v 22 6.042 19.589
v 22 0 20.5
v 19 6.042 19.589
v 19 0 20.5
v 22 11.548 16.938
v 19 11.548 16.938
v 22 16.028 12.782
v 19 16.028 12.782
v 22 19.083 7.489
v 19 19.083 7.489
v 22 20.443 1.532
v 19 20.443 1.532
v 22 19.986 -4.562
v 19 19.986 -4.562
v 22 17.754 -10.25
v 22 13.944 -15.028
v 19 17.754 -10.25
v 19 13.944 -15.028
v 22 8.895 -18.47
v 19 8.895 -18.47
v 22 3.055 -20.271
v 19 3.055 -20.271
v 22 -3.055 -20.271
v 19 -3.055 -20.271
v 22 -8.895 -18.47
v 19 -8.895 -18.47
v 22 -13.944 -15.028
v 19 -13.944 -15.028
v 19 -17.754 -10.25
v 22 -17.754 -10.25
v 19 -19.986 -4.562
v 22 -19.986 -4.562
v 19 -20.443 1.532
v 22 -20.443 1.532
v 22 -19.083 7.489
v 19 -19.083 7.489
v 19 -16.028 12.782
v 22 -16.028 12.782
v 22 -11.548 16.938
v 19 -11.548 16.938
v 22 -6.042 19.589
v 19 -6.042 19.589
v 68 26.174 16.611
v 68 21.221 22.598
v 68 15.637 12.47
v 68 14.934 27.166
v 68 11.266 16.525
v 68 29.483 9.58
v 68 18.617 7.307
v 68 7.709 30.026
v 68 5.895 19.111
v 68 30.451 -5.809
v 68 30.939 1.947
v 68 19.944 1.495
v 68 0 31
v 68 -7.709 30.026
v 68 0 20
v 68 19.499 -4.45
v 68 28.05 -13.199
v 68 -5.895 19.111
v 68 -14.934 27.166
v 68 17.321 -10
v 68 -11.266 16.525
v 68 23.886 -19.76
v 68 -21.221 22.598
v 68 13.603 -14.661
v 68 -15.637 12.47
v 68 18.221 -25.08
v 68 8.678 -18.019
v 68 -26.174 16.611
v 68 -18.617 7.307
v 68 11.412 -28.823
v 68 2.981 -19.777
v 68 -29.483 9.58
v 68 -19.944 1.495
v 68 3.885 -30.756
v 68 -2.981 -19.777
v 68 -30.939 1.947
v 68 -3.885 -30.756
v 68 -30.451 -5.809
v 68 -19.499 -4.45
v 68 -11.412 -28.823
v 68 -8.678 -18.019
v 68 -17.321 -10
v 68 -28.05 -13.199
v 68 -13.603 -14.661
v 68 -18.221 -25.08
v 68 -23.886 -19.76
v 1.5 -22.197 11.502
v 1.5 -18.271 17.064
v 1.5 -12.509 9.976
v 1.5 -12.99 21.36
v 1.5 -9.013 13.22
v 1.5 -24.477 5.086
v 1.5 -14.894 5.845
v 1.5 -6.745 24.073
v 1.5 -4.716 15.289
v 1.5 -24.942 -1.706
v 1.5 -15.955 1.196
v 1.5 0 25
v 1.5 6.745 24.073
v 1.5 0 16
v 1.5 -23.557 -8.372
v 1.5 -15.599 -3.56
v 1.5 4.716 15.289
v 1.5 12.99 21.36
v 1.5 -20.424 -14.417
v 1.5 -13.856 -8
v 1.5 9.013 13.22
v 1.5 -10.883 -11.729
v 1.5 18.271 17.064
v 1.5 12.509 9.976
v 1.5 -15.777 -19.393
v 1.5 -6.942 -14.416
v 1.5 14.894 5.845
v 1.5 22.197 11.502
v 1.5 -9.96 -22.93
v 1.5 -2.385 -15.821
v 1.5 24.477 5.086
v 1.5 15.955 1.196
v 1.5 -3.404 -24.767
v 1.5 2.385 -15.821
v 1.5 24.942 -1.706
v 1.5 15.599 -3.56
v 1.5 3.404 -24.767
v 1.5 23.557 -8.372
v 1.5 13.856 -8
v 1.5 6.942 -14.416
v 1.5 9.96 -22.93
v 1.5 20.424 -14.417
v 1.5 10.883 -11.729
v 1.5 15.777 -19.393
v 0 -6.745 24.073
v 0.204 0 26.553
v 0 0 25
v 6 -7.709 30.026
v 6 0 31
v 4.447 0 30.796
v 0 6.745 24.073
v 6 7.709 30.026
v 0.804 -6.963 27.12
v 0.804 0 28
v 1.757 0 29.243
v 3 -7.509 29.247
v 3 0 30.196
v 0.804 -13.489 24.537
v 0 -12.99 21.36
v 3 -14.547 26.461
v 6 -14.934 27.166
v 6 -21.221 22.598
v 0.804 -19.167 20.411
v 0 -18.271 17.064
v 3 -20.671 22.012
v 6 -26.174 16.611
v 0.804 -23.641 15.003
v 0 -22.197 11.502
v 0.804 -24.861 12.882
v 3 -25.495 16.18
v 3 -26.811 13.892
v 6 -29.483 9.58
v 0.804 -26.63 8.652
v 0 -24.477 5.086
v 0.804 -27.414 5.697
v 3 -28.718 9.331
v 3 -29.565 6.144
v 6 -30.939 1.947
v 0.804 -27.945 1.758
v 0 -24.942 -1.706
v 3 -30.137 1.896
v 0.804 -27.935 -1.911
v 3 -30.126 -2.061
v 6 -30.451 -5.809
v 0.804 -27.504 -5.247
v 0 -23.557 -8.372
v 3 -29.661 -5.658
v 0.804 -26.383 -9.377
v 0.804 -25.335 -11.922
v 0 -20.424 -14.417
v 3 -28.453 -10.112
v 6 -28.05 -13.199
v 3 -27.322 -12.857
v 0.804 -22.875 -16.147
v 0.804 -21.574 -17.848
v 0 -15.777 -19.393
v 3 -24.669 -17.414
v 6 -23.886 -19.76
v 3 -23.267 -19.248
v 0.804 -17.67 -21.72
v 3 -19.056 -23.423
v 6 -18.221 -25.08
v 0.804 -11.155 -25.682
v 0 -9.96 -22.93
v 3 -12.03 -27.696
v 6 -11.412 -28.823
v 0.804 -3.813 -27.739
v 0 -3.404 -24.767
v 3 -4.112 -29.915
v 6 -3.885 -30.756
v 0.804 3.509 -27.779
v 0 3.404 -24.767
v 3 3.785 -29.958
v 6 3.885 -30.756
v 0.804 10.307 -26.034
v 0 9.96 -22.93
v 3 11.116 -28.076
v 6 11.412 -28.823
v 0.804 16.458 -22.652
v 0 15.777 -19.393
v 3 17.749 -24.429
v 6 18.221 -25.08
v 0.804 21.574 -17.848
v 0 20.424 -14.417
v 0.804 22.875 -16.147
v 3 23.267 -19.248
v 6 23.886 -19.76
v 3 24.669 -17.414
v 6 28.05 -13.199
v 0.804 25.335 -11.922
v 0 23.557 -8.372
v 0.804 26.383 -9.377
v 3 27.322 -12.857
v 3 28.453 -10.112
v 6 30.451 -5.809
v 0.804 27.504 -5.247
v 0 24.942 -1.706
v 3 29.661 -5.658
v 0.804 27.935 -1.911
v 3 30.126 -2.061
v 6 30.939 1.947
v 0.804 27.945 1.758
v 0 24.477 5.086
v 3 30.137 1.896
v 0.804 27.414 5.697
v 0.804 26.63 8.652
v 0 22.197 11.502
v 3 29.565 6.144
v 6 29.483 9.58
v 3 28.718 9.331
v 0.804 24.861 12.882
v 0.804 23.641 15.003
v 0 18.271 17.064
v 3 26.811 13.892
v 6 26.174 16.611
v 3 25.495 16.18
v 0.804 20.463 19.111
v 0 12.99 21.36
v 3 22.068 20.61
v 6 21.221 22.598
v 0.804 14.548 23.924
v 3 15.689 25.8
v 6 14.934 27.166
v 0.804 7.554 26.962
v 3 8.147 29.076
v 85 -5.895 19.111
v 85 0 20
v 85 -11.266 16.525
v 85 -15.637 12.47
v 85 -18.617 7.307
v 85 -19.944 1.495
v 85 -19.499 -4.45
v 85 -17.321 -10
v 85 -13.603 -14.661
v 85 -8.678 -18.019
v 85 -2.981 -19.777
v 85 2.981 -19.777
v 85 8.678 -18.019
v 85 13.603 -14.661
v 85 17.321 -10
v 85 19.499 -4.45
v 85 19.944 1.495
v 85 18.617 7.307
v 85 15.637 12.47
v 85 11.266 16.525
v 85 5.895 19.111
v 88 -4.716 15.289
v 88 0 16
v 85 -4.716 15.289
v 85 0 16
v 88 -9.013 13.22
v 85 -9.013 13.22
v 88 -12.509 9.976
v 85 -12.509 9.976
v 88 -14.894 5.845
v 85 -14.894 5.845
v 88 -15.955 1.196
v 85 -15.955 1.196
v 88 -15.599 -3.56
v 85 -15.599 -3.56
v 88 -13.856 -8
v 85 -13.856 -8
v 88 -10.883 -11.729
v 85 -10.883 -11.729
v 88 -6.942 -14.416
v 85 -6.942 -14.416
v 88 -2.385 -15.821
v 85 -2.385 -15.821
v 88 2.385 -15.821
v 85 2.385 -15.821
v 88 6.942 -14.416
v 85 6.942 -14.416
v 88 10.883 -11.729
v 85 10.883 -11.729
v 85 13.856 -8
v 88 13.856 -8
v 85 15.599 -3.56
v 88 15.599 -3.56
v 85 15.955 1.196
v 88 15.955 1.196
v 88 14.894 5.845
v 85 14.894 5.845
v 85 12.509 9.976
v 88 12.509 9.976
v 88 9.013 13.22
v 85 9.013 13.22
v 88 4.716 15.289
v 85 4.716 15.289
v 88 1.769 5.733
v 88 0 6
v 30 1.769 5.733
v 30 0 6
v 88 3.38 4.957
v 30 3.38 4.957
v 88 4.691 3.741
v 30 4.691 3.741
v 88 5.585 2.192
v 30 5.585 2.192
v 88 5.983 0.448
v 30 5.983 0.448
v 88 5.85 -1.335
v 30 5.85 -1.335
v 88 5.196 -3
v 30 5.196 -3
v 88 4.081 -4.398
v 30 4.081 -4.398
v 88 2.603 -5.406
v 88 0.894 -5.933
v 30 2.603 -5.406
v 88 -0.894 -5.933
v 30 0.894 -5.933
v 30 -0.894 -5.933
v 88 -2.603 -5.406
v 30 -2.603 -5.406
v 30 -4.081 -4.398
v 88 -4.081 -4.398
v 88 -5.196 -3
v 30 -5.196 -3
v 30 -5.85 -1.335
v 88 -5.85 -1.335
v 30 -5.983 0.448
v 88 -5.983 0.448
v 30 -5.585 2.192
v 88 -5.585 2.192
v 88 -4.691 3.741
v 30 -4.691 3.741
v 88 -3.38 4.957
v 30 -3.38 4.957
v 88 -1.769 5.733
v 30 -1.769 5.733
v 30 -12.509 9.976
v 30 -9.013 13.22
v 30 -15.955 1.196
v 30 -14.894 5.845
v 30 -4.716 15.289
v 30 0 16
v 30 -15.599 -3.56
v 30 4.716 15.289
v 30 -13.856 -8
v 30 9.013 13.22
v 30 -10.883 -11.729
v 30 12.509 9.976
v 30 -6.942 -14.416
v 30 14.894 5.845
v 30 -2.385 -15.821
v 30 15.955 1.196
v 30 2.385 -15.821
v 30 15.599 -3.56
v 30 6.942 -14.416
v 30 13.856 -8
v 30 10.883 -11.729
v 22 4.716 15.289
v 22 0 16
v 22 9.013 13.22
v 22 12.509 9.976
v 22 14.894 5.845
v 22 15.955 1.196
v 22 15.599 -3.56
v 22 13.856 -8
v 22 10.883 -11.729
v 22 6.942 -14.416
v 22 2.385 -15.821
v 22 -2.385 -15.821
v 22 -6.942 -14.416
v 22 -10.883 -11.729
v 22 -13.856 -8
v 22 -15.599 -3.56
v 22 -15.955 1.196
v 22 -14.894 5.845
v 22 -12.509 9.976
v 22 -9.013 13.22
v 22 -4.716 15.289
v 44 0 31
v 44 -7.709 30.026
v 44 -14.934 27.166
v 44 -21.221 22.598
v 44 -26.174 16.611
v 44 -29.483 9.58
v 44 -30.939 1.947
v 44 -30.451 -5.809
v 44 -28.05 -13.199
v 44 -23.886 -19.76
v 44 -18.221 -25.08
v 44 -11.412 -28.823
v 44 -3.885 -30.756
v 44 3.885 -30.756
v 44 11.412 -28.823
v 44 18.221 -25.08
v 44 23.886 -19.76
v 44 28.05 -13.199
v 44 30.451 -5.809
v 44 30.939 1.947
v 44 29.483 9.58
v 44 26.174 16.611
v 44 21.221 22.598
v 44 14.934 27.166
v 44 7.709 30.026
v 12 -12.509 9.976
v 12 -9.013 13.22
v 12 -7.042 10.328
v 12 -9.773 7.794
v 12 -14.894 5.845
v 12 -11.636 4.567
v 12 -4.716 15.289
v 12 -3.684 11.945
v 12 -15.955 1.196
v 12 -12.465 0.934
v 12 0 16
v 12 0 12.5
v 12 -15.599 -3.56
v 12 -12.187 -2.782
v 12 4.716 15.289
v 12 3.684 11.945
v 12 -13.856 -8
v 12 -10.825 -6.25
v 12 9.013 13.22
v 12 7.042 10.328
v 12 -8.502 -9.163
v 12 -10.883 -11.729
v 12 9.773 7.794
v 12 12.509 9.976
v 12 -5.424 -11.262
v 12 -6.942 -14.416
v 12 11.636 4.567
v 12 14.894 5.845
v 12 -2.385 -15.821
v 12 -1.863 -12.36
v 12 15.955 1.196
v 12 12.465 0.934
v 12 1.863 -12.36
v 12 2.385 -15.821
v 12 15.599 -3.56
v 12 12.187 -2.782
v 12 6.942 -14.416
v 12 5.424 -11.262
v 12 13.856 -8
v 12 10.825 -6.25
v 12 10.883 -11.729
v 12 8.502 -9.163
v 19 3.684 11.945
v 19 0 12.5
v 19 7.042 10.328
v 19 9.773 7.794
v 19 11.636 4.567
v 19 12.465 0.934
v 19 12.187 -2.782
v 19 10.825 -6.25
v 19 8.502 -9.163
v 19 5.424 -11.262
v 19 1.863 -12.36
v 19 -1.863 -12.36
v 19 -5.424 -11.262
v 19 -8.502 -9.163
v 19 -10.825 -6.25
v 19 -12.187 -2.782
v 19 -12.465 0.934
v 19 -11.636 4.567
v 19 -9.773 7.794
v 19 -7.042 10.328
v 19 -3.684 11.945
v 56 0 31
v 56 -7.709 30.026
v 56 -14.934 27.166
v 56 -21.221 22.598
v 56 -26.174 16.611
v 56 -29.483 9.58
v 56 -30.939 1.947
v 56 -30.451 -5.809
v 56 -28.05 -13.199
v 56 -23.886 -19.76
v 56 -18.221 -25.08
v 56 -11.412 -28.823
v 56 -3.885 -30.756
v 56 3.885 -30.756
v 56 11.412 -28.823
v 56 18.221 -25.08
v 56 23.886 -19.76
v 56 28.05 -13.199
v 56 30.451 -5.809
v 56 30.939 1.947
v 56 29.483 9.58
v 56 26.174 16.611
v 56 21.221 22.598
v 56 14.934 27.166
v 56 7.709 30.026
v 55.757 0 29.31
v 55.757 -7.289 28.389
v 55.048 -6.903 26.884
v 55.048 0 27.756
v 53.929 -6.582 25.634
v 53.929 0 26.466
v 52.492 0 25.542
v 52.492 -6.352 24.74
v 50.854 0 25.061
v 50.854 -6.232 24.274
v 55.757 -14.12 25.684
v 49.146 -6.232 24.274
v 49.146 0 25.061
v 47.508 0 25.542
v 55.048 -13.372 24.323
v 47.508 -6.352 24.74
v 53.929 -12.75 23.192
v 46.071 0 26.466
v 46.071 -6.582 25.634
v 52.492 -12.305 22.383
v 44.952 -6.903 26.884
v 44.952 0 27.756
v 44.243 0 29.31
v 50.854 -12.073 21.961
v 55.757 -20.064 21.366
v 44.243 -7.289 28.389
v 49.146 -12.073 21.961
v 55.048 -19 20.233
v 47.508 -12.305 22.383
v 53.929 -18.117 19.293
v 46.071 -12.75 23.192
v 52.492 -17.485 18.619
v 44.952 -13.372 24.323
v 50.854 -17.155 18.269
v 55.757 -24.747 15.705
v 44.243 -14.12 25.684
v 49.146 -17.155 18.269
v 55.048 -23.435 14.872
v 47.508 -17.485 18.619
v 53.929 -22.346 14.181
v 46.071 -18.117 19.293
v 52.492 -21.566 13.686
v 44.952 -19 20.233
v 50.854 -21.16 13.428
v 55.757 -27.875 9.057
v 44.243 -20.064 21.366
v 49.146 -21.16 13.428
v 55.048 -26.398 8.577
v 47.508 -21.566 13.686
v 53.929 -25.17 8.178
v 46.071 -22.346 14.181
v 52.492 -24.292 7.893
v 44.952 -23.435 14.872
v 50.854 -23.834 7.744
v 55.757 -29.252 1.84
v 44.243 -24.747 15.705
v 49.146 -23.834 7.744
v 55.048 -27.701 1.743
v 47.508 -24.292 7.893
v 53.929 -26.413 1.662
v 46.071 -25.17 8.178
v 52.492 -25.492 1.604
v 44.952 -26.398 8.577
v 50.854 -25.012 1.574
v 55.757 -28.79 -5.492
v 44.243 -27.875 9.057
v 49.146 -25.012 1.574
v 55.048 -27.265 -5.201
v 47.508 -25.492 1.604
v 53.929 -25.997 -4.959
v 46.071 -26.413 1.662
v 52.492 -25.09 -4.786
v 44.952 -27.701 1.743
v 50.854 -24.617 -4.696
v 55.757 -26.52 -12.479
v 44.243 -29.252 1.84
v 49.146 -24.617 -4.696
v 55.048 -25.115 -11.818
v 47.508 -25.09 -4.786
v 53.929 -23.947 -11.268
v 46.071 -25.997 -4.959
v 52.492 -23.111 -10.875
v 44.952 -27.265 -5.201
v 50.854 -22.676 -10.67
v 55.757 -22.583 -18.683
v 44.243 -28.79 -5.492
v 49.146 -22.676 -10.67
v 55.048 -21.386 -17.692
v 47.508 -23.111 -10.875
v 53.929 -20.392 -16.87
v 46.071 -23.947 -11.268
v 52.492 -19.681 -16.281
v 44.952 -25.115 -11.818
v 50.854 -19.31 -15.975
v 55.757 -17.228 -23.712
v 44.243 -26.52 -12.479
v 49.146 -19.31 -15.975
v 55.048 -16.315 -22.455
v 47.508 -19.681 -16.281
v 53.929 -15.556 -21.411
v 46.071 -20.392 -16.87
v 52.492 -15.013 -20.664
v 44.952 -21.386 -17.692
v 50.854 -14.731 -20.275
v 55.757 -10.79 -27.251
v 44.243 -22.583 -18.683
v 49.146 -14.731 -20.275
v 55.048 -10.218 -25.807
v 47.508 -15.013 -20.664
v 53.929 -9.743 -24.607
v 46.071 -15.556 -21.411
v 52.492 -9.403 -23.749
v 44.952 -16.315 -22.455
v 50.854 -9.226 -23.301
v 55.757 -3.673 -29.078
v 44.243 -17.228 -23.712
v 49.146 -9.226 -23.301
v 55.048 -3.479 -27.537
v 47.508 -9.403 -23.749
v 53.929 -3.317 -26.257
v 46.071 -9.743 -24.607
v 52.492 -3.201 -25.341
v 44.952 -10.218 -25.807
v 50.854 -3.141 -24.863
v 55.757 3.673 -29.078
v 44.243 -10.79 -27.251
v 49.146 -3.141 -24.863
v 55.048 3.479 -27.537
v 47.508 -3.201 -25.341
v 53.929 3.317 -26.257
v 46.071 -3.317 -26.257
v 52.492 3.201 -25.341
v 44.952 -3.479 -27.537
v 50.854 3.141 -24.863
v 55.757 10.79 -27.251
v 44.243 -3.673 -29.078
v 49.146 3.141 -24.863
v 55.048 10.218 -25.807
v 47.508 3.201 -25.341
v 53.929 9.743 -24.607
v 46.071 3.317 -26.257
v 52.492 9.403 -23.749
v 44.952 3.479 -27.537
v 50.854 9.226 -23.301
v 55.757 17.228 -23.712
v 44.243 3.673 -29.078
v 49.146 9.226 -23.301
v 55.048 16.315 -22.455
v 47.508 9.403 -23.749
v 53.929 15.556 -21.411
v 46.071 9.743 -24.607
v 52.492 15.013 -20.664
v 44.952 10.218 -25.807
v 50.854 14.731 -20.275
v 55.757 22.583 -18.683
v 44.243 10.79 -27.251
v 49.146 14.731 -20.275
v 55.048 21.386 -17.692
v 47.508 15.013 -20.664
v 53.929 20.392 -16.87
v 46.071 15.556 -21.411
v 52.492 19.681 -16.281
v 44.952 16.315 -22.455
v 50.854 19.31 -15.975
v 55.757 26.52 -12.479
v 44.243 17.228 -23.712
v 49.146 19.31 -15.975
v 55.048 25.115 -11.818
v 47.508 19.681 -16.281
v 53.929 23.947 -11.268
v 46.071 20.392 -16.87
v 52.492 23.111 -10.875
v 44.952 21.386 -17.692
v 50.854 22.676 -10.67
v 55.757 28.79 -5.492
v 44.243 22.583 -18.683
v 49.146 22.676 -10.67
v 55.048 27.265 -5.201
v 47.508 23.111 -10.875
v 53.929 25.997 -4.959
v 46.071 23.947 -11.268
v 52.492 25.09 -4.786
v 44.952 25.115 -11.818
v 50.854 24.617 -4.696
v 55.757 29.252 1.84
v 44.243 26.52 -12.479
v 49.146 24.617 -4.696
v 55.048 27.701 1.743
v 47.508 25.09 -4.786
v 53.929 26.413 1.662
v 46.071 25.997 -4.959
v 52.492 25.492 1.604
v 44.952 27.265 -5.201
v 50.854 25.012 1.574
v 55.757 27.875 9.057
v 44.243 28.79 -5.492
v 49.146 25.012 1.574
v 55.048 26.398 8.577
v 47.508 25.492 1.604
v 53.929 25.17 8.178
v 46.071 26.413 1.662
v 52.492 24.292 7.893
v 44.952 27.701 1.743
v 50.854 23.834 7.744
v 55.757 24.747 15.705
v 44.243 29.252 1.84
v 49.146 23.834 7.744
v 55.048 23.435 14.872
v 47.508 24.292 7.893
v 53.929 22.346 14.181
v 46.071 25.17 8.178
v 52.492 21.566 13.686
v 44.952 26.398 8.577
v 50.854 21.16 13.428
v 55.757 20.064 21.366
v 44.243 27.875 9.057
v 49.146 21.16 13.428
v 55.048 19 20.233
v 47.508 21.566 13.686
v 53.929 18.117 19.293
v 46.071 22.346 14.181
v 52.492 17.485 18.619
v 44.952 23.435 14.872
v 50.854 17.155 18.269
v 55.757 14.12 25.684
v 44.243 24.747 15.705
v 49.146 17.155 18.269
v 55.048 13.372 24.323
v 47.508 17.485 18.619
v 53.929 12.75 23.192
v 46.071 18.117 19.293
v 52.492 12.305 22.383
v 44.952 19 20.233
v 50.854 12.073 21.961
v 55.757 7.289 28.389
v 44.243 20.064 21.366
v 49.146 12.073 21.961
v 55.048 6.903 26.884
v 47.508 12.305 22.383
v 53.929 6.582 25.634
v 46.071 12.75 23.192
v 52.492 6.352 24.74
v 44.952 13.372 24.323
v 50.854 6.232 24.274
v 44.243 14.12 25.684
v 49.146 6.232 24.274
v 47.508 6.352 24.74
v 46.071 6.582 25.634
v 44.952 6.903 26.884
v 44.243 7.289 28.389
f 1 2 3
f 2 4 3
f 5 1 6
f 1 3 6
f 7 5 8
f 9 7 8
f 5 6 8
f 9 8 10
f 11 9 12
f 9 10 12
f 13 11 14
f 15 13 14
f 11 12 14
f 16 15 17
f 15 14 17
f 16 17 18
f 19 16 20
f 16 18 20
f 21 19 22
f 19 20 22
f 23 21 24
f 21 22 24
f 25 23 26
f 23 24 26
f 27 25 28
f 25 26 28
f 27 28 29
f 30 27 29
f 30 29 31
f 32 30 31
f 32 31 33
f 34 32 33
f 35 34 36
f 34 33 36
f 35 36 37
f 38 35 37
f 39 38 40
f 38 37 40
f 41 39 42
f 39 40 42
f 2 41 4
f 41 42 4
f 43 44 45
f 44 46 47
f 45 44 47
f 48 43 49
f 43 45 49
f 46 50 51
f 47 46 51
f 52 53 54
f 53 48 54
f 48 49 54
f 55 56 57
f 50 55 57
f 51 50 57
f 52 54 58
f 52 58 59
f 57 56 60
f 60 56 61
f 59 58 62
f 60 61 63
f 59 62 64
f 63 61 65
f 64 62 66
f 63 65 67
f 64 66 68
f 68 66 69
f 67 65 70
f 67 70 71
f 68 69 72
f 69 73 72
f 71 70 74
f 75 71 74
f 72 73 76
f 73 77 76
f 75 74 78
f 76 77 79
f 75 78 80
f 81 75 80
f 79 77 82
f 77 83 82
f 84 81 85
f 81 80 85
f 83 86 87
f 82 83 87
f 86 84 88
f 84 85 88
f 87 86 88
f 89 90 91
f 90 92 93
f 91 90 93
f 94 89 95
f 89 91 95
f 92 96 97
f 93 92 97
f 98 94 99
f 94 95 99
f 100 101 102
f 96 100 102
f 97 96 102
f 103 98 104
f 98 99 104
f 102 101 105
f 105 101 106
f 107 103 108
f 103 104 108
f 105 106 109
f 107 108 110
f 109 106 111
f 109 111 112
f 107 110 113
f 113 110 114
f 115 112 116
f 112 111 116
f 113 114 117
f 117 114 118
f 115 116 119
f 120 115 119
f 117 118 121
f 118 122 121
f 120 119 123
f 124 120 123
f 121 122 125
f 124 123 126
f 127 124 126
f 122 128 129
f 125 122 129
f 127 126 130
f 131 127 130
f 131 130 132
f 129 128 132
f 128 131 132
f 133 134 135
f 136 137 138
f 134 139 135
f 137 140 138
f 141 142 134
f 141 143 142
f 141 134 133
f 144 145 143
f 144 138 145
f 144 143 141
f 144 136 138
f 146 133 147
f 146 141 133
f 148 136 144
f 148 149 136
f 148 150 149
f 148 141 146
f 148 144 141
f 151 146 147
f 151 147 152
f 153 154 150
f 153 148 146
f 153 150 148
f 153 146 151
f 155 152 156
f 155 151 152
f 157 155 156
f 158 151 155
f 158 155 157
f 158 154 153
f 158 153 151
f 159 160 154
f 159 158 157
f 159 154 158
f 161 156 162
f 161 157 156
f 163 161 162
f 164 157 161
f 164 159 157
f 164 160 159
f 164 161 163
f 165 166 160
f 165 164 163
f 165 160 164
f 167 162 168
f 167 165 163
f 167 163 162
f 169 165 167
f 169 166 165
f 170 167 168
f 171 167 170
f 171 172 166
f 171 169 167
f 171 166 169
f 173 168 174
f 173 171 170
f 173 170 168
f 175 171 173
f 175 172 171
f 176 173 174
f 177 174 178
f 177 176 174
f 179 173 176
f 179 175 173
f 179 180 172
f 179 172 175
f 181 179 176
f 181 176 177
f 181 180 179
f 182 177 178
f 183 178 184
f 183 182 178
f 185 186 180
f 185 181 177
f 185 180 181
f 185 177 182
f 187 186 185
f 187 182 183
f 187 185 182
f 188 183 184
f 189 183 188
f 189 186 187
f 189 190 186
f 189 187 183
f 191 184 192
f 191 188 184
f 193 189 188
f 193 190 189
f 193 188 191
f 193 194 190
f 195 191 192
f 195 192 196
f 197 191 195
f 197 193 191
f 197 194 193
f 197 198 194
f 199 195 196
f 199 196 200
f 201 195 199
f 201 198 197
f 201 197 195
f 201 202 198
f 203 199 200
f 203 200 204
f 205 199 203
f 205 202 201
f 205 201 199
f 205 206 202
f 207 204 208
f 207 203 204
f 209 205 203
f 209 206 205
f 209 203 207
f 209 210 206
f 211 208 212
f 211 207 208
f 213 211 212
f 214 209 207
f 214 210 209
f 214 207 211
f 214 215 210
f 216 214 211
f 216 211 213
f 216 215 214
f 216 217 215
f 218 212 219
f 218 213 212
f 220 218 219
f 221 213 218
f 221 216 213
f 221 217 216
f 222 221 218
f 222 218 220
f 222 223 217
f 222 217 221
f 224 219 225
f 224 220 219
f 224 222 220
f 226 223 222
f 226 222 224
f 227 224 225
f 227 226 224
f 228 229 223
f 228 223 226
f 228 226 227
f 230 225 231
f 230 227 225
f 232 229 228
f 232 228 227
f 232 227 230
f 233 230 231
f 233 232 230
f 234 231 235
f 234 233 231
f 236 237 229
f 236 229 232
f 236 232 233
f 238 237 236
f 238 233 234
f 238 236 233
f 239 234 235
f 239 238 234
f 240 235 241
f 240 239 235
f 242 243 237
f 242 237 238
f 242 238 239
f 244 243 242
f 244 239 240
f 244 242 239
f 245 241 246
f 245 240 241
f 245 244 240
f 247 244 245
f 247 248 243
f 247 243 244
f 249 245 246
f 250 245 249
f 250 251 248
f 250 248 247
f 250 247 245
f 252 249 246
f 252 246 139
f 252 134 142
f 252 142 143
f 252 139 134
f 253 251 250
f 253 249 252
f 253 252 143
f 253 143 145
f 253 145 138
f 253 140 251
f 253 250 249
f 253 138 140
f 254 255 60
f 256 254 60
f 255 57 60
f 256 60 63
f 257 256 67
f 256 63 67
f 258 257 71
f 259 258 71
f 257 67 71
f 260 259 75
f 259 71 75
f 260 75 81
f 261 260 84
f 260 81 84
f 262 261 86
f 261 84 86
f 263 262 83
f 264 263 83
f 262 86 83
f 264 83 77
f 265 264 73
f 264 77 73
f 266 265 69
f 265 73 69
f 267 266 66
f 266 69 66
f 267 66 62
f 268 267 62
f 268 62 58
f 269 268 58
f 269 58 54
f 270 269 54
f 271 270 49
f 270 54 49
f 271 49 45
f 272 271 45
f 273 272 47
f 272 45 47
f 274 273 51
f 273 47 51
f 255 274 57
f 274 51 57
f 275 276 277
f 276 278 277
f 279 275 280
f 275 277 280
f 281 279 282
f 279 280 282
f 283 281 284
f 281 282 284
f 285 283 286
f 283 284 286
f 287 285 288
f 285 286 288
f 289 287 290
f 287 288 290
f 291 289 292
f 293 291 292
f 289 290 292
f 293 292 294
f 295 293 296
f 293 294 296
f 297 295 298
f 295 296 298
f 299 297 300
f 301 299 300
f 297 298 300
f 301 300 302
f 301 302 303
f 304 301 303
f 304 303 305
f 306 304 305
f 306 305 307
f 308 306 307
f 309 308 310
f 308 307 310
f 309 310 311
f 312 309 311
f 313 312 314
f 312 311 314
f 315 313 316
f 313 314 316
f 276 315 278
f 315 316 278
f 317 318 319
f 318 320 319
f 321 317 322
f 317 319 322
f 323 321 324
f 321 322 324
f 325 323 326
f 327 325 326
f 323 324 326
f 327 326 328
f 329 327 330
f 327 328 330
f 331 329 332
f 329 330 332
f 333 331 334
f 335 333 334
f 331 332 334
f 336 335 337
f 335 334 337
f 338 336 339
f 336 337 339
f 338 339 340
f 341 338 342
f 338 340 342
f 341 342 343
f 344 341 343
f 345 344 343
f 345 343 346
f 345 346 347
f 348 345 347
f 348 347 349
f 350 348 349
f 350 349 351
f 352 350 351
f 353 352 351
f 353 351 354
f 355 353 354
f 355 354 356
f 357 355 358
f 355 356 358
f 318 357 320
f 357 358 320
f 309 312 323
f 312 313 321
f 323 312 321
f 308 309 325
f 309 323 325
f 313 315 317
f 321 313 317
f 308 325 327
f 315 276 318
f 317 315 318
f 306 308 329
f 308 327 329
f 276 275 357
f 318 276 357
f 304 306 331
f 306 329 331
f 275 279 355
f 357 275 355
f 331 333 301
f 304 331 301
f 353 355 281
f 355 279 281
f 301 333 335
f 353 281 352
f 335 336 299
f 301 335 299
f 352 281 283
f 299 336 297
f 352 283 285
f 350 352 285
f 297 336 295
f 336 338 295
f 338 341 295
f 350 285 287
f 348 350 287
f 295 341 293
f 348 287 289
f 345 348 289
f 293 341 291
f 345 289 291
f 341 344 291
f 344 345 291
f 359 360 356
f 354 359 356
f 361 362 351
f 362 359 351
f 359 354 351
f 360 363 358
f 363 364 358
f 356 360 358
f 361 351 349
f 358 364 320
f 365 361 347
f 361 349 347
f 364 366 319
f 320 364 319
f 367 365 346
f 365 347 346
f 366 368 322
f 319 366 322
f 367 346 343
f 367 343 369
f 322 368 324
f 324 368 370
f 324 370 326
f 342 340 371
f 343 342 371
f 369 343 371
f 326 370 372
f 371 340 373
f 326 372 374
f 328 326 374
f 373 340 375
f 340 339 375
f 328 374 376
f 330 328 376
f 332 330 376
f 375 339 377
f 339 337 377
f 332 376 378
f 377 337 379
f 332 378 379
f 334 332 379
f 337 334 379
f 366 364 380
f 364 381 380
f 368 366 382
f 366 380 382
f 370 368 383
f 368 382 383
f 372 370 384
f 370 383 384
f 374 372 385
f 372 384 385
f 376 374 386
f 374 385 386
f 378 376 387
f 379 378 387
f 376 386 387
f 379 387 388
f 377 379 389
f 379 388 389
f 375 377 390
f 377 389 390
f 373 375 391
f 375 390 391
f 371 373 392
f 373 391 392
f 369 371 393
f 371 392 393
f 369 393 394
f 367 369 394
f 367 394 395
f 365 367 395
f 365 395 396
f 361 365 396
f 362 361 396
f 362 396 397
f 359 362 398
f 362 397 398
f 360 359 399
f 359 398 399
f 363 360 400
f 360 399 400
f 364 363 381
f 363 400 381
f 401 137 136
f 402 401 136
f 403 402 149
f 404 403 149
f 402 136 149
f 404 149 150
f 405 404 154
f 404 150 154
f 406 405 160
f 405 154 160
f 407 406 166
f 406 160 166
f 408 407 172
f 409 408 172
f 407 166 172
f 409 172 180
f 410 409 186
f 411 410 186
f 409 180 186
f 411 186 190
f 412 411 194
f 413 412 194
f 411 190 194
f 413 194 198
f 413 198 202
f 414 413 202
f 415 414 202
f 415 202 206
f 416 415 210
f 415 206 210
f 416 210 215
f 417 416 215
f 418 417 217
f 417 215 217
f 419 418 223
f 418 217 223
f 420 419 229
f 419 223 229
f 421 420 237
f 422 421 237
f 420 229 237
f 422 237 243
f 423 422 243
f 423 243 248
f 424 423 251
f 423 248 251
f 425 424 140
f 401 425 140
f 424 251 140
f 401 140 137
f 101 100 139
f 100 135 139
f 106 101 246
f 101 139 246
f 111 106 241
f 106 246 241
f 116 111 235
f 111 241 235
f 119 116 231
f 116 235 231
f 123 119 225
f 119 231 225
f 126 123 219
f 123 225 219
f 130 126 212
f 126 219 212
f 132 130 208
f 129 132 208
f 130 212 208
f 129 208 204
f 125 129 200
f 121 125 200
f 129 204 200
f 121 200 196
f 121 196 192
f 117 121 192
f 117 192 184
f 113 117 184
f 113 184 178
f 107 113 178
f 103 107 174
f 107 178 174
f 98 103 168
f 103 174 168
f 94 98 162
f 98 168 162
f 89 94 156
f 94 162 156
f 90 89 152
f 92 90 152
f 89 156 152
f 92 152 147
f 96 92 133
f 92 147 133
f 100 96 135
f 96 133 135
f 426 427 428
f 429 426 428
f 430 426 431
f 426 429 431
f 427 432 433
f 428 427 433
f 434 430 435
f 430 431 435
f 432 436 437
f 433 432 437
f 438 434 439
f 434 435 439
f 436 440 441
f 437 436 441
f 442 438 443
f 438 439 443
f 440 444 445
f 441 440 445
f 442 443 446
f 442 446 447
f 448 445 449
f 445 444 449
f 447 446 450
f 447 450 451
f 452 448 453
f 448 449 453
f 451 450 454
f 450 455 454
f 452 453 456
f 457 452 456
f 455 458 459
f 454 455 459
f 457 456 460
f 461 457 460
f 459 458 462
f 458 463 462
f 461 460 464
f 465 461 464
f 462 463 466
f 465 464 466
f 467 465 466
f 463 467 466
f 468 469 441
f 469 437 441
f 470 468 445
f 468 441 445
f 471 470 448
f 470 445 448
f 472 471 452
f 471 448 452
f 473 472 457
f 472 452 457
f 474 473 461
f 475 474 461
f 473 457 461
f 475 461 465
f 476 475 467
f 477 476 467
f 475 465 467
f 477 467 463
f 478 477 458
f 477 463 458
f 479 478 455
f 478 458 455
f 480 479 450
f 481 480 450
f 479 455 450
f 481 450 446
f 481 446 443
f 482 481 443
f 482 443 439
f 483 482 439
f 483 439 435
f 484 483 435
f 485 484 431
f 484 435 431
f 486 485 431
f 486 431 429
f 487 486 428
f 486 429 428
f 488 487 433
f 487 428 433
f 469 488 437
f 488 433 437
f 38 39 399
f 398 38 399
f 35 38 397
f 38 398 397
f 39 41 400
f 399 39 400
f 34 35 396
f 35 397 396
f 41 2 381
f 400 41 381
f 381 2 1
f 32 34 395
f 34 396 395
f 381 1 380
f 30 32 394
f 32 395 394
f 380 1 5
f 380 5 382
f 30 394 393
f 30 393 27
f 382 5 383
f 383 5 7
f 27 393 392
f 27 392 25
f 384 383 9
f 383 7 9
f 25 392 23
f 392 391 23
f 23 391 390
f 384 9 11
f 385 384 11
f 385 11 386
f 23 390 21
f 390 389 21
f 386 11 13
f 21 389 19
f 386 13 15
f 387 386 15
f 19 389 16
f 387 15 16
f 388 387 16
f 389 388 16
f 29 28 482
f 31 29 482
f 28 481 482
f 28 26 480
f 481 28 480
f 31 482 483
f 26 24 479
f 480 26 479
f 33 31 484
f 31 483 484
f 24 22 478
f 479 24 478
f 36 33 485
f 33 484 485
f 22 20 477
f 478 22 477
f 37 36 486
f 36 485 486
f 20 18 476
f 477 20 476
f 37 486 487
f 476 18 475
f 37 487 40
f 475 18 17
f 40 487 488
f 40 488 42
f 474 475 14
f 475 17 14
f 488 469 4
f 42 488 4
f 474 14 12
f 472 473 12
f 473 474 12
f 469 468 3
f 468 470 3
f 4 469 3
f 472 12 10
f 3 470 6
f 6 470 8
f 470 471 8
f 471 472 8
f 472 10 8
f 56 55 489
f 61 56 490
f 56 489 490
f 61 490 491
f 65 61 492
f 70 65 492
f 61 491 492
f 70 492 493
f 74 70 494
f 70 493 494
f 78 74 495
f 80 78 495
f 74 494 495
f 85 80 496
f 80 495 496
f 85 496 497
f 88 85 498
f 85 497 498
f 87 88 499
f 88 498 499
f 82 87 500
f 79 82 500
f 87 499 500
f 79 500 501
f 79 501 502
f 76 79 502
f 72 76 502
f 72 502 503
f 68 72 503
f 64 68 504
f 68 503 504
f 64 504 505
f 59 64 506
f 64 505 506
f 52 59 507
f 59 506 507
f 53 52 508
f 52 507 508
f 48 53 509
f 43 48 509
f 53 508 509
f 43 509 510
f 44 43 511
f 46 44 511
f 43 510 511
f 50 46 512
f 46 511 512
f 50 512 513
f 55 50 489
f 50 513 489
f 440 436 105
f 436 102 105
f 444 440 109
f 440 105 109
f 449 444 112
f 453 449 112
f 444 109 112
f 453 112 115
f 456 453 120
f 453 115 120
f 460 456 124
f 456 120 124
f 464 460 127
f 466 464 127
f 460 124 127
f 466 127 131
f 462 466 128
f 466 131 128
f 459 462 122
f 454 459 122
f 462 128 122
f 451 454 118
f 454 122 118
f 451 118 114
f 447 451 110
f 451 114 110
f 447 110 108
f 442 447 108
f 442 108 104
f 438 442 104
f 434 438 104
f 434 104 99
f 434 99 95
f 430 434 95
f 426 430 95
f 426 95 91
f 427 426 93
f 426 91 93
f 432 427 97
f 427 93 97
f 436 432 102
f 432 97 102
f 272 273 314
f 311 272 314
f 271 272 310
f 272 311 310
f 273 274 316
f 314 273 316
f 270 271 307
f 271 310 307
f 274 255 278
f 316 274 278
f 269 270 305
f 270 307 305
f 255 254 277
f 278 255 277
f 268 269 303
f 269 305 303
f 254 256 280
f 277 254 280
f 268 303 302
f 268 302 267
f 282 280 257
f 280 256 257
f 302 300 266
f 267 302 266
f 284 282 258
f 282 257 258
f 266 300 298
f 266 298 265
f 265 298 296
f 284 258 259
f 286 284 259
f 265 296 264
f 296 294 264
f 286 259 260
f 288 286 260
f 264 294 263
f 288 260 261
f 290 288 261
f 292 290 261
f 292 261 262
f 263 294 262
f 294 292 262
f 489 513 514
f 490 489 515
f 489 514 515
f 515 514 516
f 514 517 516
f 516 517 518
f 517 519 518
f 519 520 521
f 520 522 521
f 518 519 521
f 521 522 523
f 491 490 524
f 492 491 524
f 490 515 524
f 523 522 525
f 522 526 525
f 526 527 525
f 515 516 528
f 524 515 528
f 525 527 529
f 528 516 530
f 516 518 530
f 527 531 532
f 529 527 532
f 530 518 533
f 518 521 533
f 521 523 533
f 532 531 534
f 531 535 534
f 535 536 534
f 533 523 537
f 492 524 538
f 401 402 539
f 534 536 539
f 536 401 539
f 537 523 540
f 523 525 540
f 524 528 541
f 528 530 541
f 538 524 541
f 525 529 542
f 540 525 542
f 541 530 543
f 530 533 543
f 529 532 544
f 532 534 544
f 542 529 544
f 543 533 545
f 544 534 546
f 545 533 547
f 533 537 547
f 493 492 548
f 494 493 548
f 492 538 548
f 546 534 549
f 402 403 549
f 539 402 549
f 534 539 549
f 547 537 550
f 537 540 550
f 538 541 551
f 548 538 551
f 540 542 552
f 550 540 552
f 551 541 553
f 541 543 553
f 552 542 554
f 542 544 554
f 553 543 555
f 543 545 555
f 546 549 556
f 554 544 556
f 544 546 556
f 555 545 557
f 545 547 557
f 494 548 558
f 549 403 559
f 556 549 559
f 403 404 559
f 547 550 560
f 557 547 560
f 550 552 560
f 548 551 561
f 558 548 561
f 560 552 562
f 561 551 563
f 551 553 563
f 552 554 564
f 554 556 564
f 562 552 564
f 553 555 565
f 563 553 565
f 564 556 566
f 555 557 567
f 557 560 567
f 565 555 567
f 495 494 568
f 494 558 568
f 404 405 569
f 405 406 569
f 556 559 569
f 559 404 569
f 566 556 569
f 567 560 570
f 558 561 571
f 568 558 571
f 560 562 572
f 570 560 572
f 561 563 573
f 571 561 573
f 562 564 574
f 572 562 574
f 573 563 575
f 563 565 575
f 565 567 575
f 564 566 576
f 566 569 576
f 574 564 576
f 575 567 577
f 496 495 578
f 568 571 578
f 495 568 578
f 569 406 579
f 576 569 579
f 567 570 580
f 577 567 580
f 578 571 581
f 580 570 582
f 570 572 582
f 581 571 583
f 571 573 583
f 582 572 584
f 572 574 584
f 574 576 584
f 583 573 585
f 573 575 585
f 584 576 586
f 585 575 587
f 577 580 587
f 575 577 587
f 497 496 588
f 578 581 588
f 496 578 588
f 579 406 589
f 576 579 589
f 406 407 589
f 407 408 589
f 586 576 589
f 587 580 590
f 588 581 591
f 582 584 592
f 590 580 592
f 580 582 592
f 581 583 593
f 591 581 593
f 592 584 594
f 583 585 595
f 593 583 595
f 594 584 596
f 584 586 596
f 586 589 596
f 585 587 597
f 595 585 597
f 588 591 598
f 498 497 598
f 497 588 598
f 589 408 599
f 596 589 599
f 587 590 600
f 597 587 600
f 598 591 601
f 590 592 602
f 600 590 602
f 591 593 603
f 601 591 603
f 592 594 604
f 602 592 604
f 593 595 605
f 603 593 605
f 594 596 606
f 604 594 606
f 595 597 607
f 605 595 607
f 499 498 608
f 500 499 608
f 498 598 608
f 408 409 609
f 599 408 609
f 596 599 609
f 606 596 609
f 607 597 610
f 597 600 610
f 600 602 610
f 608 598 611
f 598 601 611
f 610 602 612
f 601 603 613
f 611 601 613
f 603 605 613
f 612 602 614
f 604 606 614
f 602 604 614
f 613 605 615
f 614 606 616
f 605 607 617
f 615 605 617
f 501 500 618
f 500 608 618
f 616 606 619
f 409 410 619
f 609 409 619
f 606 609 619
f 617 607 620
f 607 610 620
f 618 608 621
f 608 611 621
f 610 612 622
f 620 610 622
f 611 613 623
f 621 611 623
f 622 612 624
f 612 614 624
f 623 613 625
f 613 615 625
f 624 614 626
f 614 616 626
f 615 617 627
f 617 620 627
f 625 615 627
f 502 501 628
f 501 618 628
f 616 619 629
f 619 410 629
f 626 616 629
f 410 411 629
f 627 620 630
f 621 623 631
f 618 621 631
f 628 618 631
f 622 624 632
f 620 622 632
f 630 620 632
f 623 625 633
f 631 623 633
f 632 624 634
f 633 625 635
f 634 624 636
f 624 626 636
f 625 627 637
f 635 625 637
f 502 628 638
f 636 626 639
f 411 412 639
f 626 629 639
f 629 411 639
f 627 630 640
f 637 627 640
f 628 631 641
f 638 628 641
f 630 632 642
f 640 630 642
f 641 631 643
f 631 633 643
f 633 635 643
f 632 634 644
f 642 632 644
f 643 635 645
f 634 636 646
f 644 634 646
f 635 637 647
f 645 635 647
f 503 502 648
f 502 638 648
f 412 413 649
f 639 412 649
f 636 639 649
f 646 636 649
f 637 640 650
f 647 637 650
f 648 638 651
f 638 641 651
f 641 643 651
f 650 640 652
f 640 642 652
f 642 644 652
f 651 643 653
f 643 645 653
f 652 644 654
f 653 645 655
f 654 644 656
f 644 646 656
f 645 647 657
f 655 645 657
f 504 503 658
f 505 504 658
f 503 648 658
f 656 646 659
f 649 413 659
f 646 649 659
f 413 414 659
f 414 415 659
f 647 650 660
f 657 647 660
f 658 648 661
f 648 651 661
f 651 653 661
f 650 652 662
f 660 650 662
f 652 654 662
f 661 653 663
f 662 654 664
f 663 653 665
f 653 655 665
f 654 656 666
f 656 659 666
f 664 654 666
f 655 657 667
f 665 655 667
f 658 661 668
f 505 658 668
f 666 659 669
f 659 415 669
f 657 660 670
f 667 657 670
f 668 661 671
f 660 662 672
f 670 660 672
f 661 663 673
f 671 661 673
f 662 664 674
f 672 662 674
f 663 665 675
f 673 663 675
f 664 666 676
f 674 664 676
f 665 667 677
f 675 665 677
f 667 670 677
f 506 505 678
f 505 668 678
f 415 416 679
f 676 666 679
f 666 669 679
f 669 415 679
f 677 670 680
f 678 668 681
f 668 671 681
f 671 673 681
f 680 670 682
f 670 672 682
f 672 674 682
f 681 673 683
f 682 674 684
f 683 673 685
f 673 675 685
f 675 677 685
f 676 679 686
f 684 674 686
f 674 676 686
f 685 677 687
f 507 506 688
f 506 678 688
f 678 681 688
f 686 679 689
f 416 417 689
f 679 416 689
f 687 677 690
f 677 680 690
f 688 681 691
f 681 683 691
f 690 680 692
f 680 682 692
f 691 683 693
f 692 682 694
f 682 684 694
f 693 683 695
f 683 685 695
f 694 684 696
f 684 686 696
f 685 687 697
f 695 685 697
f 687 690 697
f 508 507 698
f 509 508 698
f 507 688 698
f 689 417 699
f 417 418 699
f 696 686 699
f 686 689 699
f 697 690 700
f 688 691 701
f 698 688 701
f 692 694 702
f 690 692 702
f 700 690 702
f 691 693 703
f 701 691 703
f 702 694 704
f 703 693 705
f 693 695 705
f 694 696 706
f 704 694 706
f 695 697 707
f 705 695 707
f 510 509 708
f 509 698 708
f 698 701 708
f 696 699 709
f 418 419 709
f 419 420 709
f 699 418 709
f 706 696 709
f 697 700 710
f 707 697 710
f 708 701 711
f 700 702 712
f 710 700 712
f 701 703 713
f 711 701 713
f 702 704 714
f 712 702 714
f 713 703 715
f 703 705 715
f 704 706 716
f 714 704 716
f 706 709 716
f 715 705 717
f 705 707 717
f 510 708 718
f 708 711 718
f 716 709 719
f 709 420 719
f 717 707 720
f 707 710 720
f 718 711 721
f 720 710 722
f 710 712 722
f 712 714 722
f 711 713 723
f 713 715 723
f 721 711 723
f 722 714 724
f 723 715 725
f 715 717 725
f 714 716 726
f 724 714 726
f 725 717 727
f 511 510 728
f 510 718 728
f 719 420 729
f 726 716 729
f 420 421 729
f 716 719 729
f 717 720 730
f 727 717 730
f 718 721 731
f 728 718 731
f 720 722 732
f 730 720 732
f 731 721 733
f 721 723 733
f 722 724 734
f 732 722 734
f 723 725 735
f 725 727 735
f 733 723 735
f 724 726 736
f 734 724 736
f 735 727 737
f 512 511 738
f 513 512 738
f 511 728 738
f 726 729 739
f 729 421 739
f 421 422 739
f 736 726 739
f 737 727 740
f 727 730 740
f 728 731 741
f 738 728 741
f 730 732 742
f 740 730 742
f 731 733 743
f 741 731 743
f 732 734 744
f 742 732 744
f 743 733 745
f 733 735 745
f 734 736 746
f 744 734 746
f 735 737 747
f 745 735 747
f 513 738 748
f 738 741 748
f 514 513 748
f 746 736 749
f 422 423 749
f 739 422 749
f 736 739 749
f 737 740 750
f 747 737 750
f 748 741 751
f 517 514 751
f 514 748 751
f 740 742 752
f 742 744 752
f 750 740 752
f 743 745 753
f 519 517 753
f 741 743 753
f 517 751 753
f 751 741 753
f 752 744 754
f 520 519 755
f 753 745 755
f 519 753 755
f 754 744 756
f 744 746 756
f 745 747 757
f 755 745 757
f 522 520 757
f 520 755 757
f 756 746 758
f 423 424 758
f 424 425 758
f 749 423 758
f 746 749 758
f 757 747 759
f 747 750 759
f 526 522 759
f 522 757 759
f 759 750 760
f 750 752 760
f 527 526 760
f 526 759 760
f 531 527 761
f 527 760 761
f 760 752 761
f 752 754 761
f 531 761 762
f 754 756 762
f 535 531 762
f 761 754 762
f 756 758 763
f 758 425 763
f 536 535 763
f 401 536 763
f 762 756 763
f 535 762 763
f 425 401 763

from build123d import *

# Parameters (mm, degrees)
F4_R = 5.99999


# Not quite as in the source:
# - a fillet or chamfer is up to 0.001 mm smaller than in the source, because OpenCascade refuses the exact size


with BuildPart() as f1:
    # F0 (on Front) → F1 (revolve)
    with BuildSketch(Plane.XZ):
        with BuildLine():
            Line((0, 31), (0, 0))
            Line((0, 0), (88, 0))
            Line((88, 0), (88, 16))
            Line((88, 16), (85, 16))
            Line((85, 16), (85, 20))
            Line((85, 20), (68, 20))
            Line((68, 20), (68, 31))
            Line((68, 31), (56, 31))
            ThreePointArc((56, 31), (50, 25), (44, 31))
            Line((44, 31), (0, 31))
        make_face()
    revolve(axis=Axis((68.2048197045, 0, 0), (1, 0, 0)))

    # F2 (on Front) → F3 (revolve, cut)
    with BuildSketch(Plane.XZ):
        Polygon((1.5, 25), (0, 25), (0, 0), (88, 0), (88, 6), (30, 6), (30, 16), (22, 16), (22, 20.5), (19, 20.5), (19, 12.5), (12, 12.5), (12, 16), (1.5, 16), align=None)
    revolve(axis=Axis((-8.4996176884, 0, 0), (-1, 0, 0)), mode=Mode.SUBTRACT)

    # F4 (radius 6 in the source; OpenCascade refuses exactly that, so slightly less here)
    f4_edges = [f1.edges().sort_by_distance(p)[0] for p in [
        (0, 0, -31),
    ]]
    fillet(f4_edges, radius=F4_R)


solid = f1.part
